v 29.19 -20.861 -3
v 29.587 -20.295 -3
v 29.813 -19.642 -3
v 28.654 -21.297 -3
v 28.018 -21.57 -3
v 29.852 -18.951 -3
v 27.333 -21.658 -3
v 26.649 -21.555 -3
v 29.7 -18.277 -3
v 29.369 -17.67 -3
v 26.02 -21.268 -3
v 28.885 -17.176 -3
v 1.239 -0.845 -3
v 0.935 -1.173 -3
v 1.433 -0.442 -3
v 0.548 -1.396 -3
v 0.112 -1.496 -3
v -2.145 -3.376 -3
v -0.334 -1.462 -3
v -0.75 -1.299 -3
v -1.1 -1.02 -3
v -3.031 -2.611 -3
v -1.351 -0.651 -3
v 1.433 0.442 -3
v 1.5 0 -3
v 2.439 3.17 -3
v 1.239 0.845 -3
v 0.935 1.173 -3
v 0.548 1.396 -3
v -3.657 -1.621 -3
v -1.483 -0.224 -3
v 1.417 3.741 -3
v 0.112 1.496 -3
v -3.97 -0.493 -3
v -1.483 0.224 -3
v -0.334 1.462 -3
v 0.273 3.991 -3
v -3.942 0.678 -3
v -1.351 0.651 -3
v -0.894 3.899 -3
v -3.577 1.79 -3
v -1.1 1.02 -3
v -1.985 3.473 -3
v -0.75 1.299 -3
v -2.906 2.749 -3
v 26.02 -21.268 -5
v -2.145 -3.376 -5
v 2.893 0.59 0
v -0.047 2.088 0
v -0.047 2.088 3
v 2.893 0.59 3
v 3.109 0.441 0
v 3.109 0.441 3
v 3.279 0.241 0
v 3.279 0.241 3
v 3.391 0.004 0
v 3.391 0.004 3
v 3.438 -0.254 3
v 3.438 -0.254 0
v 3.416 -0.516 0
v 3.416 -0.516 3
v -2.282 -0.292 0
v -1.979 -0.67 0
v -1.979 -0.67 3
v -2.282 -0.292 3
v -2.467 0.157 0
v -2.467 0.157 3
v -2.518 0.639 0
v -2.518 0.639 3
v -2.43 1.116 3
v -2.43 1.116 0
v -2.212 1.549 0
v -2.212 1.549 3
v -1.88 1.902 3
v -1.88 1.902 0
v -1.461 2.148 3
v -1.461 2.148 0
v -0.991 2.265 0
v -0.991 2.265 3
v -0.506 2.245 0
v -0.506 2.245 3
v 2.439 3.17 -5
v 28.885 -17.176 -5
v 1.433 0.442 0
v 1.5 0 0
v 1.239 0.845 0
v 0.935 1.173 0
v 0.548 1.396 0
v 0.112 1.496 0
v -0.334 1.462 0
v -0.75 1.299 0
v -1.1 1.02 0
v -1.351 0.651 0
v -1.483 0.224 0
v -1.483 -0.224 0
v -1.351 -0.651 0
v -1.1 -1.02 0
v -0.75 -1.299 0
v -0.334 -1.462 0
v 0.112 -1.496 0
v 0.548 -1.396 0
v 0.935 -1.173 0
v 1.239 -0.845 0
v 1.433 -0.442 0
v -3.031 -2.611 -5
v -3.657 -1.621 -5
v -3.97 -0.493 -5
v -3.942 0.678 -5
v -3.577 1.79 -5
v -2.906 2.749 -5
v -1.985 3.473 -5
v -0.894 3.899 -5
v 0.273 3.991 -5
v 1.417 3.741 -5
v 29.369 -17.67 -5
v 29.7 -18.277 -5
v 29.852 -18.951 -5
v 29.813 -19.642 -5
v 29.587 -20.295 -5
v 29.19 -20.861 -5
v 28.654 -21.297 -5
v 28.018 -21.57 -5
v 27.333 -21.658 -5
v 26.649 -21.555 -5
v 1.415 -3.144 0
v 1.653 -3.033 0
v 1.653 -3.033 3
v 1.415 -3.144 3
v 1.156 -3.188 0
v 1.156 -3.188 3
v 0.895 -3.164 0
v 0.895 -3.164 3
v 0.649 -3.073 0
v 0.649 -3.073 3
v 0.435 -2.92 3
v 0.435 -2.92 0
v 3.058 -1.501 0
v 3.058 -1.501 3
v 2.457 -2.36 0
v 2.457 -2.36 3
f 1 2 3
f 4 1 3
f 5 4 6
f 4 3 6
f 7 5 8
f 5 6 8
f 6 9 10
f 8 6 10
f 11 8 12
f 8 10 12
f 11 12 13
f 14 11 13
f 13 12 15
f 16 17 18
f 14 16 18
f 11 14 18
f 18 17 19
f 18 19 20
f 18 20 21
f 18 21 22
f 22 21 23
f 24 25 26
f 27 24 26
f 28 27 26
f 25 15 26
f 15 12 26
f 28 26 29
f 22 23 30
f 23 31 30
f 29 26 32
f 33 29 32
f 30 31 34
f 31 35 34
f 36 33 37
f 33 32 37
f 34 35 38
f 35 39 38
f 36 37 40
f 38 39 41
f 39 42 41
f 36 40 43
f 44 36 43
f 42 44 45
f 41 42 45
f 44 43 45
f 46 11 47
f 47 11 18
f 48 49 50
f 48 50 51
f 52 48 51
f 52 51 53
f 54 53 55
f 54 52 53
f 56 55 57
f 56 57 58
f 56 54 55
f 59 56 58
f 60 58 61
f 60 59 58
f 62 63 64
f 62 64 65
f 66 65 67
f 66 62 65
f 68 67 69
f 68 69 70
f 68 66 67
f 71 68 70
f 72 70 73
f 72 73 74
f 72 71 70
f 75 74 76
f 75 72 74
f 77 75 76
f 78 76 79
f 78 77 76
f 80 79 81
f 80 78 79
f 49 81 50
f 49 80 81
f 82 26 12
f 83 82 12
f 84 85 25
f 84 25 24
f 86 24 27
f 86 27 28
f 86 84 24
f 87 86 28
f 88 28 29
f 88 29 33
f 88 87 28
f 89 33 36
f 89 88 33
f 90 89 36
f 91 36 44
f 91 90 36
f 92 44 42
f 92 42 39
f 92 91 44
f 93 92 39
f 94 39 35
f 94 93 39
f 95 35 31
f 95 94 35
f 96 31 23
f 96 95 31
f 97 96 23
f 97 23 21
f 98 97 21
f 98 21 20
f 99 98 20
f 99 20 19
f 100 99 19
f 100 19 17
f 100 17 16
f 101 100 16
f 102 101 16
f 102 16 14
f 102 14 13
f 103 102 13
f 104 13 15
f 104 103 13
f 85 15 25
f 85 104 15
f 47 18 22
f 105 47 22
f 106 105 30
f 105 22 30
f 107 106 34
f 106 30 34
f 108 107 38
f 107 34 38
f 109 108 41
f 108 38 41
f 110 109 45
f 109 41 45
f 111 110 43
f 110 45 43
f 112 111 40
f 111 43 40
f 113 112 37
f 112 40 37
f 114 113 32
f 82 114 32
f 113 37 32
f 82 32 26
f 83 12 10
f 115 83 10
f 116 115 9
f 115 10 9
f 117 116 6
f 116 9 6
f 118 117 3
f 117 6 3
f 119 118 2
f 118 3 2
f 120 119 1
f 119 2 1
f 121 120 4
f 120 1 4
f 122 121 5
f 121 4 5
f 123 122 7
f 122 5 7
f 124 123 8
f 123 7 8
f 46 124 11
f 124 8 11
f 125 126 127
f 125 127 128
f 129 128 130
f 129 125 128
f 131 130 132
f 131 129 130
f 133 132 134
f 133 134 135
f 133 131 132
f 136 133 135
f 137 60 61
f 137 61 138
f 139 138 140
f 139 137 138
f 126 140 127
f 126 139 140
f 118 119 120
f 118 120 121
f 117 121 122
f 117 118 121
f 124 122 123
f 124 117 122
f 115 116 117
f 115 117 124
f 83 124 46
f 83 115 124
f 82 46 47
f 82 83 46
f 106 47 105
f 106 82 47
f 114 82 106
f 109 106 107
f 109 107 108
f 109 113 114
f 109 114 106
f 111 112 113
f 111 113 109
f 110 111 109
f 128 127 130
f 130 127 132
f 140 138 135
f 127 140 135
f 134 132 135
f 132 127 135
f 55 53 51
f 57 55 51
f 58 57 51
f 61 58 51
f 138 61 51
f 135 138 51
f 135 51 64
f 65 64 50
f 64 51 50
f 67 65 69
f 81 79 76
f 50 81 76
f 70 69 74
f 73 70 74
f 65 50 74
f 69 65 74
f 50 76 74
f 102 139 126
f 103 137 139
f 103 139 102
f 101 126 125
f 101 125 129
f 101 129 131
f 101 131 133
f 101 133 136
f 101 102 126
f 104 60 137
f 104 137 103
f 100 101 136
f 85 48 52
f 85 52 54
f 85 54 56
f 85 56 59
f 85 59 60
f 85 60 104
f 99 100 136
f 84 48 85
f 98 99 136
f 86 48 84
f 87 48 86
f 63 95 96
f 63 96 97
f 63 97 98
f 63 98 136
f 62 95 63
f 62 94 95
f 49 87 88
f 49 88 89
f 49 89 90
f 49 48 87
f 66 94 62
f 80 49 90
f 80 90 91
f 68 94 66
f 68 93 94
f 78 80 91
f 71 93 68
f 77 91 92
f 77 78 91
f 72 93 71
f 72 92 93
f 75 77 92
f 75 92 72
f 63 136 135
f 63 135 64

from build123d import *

# Parameters (mm, degrees)
EXTRUDE_1_DEPTH = 3
SKETCH_1_3_R    = 1.5
EXTRUDE_2_DEPTH = 3
EXTRUDE_3_DEPTH = 2


with BuildPart() as part:
    # 草图1 → 凸台-拉伸1 (new body)
    with BuildSketch(Plane.XY):
        with BuildLine():
            ThreePointArc((-0.047368195, 2.088287527), (-2.21171052, 1.548656378), (-1.978549256, -0.669724856))
            Line((-1.978549256, -0.669724856), (0.434917959, -2.920319445))
            ThreePointArc((0.434917959, -2.920319445), (1.024622501, -3.18469756), (1.652873302, -3.033211035))
            ThreePointArc((1.652873302, -3.033211035), (2.785653548, -1.950535613), (3.41560199, -0.515773572))
            ThreePointArc((3.41560199, -0.515773572), (3.343078331, 0.126400512), (2.892953335, 0.590118878))
            Line((2.892953335, 0.590118878), (-0.047368195, 2.088287527))
        make_face()
    extrude(amount=EXTRUDE_1_DEPTH)

    # 草图1<3> → 凸台-拉伸2 (add)
    with BuildSketch(Plane.XY):
        Circle(SKETCH_1_3_R)
    extrude(amount=-EXTRUDE_2_DEPTH)

    # 草图2 → 凸台-拉伸3 (add)
    with BuildSketch(Plane(origin=(0, 0, -3), x_dir=(-1, 0, 0), z_dir=(0, 0, -1))):
        with BuildLine():
            Line((-2.439141124, 3.170266641), (-28.884678079, -17.176412053))
            ThreePointArc((-28.884678079, -17.176412053), (-29.408094987, -20.591769795), (-26.019689394, -21.268039933))
            Line((-26.019689394, -21.268039933), (2.144840772, -3.376337966))
            ThreePointArc((2.144840772, -3.376337966), (3.276608177, 2.294305745), (-2.439141124, 3.170266641))
        make_face()
    extrude(amount=EXTRUDE_3_DEPTH)


solid = part.part
